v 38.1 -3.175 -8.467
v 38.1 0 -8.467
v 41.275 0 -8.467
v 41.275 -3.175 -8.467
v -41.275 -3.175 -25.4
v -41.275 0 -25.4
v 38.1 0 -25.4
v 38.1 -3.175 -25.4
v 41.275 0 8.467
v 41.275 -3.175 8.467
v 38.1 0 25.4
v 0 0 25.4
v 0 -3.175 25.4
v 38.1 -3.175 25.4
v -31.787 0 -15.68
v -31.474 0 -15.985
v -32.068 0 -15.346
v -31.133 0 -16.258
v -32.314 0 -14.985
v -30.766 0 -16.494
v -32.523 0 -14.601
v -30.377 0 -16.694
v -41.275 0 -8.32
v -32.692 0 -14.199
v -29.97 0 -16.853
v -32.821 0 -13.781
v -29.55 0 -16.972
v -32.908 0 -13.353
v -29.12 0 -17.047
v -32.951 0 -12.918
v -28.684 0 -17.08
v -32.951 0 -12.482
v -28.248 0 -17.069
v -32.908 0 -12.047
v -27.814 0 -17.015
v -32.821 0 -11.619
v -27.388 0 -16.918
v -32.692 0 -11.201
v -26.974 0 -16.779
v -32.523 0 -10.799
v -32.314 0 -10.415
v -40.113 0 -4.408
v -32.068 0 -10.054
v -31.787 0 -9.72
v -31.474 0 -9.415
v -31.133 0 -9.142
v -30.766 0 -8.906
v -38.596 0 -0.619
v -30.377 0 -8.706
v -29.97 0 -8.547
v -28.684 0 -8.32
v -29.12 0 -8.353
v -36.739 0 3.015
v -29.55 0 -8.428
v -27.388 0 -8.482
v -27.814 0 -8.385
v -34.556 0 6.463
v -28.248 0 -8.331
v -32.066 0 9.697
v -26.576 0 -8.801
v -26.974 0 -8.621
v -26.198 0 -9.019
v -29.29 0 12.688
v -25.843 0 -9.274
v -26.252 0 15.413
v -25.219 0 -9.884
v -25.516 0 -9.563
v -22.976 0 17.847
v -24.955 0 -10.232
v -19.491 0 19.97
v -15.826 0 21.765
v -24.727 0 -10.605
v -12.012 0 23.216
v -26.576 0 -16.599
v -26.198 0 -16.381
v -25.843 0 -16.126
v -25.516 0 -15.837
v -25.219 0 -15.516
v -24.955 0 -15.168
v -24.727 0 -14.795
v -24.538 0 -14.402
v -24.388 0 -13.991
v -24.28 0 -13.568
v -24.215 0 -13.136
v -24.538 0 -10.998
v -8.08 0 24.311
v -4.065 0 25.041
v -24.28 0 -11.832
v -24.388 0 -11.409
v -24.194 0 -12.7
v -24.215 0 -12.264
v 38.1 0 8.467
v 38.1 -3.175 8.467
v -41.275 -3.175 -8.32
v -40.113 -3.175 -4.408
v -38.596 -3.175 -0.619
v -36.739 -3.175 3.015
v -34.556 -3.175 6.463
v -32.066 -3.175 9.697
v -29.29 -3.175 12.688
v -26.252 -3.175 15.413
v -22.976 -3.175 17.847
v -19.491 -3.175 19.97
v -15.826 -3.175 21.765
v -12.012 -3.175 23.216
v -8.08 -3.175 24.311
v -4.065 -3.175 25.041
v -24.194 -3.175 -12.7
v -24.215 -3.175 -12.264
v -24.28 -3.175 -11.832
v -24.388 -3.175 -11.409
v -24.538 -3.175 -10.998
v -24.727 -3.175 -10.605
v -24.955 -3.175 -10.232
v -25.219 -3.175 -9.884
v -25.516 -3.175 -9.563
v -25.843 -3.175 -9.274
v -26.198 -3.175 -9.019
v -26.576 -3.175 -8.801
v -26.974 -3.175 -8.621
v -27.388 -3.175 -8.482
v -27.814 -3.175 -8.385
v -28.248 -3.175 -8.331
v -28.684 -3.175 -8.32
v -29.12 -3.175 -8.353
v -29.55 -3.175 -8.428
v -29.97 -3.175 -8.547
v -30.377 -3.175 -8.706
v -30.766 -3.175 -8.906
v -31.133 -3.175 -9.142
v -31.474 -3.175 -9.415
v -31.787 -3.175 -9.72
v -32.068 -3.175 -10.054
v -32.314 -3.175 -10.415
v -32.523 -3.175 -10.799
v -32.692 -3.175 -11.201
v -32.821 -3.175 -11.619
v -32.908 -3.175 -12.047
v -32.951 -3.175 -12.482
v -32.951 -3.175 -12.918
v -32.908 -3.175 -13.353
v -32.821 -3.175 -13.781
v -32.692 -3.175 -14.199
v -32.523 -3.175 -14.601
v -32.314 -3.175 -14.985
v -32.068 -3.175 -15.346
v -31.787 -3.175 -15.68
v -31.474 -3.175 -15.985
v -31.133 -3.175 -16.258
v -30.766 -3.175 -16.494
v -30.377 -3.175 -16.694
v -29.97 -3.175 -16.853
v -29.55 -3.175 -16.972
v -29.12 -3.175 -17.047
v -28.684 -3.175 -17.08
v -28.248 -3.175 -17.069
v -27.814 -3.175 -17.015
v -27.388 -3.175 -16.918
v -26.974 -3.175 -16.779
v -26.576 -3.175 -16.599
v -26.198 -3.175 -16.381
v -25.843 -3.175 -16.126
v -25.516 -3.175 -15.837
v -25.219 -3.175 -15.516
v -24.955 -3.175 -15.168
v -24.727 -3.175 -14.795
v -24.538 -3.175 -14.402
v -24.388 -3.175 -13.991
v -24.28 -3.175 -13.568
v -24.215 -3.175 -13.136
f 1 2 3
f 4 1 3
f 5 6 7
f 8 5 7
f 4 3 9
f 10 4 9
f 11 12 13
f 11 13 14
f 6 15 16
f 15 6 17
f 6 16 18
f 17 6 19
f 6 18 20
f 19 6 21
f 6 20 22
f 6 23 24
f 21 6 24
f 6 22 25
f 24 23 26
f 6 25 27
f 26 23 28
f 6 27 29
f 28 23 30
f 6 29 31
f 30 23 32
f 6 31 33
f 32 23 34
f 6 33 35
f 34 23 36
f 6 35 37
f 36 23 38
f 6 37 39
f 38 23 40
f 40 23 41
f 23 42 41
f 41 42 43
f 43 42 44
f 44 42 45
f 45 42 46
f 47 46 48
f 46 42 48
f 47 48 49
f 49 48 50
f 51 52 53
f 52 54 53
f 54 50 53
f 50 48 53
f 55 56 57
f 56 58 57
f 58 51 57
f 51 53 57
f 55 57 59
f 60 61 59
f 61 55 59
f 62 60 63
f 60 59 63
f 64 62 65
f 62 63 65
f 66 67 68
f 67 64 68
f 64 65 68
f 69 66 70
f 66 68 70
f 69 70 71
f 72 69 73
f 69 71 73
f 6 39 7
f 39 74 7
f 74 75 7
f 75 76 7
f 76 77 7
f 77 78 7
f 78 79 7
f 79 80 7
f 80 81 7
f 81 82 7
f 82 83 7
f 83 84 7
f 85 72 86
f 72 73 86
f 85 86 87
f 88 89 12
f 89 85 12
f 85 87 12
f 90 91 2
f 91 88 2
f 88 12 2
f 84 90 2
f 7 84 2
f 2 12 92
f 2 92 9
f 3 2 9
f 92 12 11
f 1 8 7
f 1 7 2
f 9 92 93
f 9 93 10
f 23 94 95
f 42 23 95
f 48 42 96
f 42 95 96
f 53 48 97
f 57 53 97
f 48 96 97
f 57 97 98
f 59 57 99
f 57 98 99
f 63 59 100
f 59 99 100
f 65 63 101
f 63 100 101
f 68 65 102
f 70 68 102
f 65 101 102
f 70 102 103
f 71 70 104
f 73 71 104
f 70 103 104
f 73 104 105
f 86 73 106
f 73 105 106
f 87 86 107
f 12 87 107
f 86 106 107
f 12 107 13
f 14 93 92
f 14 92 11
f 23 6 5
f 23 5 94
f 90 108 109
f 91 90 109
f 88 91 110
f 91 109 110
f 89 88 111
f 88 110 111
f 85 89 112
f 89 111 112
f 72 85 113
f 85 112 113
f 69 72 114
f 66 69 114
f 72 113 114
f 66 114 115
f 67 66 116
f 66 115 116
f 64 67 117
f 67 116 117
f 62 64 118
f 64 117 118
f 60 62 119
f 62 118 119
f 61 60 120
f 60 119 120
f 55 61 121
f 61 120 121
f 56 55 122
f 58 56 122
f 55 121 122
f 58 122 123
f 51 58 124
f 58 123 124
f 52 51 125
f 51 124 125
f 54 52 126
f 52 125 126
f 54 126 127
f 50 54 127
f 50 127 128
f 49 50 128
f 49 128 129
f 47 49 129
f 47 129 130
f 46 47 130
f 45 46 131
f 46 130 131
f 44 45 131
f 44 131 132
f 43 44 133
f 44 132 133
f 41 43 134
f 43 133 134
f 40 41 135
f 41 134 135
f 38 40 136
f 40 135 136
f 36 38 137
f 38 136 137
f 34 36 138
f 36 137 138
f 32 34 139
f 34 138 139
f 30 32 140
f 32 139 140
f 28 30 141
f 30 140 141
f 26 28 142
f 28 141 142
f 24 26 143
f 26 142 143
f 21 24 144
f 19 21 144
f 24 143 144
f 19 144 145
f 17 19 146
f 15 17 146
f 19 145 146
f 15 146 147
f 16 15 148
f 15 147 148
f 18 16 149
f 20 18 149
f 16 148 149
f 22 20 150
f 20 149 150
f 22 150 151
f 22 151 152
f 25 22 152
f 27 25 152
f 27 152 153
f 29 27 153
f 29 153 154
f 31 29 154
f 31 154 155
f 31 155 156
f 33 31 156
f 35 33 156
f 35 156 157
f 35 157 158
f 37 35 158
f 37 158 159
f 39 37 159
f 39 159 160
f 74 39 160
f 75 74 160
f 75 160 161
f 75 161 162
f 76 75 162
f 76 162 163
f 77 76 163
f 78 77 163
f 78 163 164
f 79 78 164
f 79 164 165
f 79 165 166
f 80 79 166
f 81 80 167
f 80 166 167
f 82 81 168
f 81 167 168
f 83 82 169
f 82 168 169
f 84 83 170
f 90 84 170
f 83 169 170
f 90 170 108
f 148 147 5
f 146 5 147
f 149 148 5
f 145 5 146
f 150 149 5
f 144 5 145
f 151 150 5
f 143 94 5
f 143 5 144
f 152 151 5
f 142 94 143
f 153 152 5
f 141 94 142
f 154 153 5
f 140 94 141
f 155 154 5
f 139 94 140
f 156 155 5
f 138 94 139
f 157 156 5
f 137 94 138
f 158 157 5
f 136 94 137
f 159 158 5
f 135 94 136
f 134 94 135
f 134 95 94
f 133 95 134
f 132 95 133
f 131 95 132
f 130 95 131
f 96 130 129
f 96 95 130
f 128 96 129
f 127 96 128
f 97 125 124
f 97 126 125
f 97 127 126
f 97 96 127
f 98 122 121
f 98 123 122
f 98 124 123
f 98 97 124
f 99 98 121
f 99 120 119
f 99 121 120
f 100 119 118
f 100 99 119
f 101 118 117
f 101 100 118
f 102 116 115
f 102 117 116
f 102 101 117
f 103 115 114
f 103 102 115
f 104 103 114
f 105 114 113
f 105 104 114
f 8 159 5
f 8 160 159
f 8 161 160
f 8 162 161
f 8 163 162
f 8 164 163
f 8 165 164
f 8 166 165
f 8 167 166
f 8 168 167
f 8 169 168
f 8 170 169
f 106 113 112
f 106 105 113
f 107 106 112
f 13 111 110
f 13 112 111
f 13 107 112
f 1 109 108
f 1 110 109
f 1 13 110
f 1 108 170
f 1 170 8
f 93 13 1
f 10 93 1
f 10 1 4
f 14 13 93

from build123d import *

# Parameters (mm, degrees)
F0_W     = 82.55
F0_H     = 50.8
F1_DEPTH = 3.175
F2_R     = 4.3815
F3_DEPTH = 3.175
F5_DEPTH = 3.175
F6_W     = 3.175
F6_H     = 16.9333333333
F7_DEPTH = 3.175


with BuildPart() as f1:
    # F0 (on Front) → F1 (new body)
    with BuildSketch(Plane.XZ):
        Rectangle(F0_W, F0_H)
    extrude(amount=F1_DEPTH)

    # F2 (on face) → F3 (cut)
    with BuildSketch(Plane.XZ.offset(3.175)):
        with Locations((-28.575, -12.7)):
            Circle(F2_R)
    extrude(amount=-F3_DEPTH, mode=Mode.SUBTRACT)

    # F4 (on face) → F5 (cut)
    with BuildSketch(Plane.XZ.offset(3.175)):
        with BuildLine():
            ThreePointArc((-41.275, -8.3196220329), (-26.2518600879, 15.4125291421), (0, 25.4))
            Line((0, 25.4), (-41.275, 25.4))
            Line((-41.275, 25.4), (-41.275, -8.3196220329))
        make_face()
    extrude(amount=-F5_DEPTH, mode=Mode.SUBTRACT)

    # F6 (on face) → F7 (cut)
    with BuildSketch(Plane.XZ.offset(3.175)):
        with Locations((39.6875, 16.9333333333)):
            Rectangle(F6_W, F6_H)
        with Locations((39.6875, -16.9333333333)):
            Rectangle(F6_W, F6_H)
    extrude(amount=-F7_DEPTH, mode=Mode.SUBTRACT)


solid = f1.part
